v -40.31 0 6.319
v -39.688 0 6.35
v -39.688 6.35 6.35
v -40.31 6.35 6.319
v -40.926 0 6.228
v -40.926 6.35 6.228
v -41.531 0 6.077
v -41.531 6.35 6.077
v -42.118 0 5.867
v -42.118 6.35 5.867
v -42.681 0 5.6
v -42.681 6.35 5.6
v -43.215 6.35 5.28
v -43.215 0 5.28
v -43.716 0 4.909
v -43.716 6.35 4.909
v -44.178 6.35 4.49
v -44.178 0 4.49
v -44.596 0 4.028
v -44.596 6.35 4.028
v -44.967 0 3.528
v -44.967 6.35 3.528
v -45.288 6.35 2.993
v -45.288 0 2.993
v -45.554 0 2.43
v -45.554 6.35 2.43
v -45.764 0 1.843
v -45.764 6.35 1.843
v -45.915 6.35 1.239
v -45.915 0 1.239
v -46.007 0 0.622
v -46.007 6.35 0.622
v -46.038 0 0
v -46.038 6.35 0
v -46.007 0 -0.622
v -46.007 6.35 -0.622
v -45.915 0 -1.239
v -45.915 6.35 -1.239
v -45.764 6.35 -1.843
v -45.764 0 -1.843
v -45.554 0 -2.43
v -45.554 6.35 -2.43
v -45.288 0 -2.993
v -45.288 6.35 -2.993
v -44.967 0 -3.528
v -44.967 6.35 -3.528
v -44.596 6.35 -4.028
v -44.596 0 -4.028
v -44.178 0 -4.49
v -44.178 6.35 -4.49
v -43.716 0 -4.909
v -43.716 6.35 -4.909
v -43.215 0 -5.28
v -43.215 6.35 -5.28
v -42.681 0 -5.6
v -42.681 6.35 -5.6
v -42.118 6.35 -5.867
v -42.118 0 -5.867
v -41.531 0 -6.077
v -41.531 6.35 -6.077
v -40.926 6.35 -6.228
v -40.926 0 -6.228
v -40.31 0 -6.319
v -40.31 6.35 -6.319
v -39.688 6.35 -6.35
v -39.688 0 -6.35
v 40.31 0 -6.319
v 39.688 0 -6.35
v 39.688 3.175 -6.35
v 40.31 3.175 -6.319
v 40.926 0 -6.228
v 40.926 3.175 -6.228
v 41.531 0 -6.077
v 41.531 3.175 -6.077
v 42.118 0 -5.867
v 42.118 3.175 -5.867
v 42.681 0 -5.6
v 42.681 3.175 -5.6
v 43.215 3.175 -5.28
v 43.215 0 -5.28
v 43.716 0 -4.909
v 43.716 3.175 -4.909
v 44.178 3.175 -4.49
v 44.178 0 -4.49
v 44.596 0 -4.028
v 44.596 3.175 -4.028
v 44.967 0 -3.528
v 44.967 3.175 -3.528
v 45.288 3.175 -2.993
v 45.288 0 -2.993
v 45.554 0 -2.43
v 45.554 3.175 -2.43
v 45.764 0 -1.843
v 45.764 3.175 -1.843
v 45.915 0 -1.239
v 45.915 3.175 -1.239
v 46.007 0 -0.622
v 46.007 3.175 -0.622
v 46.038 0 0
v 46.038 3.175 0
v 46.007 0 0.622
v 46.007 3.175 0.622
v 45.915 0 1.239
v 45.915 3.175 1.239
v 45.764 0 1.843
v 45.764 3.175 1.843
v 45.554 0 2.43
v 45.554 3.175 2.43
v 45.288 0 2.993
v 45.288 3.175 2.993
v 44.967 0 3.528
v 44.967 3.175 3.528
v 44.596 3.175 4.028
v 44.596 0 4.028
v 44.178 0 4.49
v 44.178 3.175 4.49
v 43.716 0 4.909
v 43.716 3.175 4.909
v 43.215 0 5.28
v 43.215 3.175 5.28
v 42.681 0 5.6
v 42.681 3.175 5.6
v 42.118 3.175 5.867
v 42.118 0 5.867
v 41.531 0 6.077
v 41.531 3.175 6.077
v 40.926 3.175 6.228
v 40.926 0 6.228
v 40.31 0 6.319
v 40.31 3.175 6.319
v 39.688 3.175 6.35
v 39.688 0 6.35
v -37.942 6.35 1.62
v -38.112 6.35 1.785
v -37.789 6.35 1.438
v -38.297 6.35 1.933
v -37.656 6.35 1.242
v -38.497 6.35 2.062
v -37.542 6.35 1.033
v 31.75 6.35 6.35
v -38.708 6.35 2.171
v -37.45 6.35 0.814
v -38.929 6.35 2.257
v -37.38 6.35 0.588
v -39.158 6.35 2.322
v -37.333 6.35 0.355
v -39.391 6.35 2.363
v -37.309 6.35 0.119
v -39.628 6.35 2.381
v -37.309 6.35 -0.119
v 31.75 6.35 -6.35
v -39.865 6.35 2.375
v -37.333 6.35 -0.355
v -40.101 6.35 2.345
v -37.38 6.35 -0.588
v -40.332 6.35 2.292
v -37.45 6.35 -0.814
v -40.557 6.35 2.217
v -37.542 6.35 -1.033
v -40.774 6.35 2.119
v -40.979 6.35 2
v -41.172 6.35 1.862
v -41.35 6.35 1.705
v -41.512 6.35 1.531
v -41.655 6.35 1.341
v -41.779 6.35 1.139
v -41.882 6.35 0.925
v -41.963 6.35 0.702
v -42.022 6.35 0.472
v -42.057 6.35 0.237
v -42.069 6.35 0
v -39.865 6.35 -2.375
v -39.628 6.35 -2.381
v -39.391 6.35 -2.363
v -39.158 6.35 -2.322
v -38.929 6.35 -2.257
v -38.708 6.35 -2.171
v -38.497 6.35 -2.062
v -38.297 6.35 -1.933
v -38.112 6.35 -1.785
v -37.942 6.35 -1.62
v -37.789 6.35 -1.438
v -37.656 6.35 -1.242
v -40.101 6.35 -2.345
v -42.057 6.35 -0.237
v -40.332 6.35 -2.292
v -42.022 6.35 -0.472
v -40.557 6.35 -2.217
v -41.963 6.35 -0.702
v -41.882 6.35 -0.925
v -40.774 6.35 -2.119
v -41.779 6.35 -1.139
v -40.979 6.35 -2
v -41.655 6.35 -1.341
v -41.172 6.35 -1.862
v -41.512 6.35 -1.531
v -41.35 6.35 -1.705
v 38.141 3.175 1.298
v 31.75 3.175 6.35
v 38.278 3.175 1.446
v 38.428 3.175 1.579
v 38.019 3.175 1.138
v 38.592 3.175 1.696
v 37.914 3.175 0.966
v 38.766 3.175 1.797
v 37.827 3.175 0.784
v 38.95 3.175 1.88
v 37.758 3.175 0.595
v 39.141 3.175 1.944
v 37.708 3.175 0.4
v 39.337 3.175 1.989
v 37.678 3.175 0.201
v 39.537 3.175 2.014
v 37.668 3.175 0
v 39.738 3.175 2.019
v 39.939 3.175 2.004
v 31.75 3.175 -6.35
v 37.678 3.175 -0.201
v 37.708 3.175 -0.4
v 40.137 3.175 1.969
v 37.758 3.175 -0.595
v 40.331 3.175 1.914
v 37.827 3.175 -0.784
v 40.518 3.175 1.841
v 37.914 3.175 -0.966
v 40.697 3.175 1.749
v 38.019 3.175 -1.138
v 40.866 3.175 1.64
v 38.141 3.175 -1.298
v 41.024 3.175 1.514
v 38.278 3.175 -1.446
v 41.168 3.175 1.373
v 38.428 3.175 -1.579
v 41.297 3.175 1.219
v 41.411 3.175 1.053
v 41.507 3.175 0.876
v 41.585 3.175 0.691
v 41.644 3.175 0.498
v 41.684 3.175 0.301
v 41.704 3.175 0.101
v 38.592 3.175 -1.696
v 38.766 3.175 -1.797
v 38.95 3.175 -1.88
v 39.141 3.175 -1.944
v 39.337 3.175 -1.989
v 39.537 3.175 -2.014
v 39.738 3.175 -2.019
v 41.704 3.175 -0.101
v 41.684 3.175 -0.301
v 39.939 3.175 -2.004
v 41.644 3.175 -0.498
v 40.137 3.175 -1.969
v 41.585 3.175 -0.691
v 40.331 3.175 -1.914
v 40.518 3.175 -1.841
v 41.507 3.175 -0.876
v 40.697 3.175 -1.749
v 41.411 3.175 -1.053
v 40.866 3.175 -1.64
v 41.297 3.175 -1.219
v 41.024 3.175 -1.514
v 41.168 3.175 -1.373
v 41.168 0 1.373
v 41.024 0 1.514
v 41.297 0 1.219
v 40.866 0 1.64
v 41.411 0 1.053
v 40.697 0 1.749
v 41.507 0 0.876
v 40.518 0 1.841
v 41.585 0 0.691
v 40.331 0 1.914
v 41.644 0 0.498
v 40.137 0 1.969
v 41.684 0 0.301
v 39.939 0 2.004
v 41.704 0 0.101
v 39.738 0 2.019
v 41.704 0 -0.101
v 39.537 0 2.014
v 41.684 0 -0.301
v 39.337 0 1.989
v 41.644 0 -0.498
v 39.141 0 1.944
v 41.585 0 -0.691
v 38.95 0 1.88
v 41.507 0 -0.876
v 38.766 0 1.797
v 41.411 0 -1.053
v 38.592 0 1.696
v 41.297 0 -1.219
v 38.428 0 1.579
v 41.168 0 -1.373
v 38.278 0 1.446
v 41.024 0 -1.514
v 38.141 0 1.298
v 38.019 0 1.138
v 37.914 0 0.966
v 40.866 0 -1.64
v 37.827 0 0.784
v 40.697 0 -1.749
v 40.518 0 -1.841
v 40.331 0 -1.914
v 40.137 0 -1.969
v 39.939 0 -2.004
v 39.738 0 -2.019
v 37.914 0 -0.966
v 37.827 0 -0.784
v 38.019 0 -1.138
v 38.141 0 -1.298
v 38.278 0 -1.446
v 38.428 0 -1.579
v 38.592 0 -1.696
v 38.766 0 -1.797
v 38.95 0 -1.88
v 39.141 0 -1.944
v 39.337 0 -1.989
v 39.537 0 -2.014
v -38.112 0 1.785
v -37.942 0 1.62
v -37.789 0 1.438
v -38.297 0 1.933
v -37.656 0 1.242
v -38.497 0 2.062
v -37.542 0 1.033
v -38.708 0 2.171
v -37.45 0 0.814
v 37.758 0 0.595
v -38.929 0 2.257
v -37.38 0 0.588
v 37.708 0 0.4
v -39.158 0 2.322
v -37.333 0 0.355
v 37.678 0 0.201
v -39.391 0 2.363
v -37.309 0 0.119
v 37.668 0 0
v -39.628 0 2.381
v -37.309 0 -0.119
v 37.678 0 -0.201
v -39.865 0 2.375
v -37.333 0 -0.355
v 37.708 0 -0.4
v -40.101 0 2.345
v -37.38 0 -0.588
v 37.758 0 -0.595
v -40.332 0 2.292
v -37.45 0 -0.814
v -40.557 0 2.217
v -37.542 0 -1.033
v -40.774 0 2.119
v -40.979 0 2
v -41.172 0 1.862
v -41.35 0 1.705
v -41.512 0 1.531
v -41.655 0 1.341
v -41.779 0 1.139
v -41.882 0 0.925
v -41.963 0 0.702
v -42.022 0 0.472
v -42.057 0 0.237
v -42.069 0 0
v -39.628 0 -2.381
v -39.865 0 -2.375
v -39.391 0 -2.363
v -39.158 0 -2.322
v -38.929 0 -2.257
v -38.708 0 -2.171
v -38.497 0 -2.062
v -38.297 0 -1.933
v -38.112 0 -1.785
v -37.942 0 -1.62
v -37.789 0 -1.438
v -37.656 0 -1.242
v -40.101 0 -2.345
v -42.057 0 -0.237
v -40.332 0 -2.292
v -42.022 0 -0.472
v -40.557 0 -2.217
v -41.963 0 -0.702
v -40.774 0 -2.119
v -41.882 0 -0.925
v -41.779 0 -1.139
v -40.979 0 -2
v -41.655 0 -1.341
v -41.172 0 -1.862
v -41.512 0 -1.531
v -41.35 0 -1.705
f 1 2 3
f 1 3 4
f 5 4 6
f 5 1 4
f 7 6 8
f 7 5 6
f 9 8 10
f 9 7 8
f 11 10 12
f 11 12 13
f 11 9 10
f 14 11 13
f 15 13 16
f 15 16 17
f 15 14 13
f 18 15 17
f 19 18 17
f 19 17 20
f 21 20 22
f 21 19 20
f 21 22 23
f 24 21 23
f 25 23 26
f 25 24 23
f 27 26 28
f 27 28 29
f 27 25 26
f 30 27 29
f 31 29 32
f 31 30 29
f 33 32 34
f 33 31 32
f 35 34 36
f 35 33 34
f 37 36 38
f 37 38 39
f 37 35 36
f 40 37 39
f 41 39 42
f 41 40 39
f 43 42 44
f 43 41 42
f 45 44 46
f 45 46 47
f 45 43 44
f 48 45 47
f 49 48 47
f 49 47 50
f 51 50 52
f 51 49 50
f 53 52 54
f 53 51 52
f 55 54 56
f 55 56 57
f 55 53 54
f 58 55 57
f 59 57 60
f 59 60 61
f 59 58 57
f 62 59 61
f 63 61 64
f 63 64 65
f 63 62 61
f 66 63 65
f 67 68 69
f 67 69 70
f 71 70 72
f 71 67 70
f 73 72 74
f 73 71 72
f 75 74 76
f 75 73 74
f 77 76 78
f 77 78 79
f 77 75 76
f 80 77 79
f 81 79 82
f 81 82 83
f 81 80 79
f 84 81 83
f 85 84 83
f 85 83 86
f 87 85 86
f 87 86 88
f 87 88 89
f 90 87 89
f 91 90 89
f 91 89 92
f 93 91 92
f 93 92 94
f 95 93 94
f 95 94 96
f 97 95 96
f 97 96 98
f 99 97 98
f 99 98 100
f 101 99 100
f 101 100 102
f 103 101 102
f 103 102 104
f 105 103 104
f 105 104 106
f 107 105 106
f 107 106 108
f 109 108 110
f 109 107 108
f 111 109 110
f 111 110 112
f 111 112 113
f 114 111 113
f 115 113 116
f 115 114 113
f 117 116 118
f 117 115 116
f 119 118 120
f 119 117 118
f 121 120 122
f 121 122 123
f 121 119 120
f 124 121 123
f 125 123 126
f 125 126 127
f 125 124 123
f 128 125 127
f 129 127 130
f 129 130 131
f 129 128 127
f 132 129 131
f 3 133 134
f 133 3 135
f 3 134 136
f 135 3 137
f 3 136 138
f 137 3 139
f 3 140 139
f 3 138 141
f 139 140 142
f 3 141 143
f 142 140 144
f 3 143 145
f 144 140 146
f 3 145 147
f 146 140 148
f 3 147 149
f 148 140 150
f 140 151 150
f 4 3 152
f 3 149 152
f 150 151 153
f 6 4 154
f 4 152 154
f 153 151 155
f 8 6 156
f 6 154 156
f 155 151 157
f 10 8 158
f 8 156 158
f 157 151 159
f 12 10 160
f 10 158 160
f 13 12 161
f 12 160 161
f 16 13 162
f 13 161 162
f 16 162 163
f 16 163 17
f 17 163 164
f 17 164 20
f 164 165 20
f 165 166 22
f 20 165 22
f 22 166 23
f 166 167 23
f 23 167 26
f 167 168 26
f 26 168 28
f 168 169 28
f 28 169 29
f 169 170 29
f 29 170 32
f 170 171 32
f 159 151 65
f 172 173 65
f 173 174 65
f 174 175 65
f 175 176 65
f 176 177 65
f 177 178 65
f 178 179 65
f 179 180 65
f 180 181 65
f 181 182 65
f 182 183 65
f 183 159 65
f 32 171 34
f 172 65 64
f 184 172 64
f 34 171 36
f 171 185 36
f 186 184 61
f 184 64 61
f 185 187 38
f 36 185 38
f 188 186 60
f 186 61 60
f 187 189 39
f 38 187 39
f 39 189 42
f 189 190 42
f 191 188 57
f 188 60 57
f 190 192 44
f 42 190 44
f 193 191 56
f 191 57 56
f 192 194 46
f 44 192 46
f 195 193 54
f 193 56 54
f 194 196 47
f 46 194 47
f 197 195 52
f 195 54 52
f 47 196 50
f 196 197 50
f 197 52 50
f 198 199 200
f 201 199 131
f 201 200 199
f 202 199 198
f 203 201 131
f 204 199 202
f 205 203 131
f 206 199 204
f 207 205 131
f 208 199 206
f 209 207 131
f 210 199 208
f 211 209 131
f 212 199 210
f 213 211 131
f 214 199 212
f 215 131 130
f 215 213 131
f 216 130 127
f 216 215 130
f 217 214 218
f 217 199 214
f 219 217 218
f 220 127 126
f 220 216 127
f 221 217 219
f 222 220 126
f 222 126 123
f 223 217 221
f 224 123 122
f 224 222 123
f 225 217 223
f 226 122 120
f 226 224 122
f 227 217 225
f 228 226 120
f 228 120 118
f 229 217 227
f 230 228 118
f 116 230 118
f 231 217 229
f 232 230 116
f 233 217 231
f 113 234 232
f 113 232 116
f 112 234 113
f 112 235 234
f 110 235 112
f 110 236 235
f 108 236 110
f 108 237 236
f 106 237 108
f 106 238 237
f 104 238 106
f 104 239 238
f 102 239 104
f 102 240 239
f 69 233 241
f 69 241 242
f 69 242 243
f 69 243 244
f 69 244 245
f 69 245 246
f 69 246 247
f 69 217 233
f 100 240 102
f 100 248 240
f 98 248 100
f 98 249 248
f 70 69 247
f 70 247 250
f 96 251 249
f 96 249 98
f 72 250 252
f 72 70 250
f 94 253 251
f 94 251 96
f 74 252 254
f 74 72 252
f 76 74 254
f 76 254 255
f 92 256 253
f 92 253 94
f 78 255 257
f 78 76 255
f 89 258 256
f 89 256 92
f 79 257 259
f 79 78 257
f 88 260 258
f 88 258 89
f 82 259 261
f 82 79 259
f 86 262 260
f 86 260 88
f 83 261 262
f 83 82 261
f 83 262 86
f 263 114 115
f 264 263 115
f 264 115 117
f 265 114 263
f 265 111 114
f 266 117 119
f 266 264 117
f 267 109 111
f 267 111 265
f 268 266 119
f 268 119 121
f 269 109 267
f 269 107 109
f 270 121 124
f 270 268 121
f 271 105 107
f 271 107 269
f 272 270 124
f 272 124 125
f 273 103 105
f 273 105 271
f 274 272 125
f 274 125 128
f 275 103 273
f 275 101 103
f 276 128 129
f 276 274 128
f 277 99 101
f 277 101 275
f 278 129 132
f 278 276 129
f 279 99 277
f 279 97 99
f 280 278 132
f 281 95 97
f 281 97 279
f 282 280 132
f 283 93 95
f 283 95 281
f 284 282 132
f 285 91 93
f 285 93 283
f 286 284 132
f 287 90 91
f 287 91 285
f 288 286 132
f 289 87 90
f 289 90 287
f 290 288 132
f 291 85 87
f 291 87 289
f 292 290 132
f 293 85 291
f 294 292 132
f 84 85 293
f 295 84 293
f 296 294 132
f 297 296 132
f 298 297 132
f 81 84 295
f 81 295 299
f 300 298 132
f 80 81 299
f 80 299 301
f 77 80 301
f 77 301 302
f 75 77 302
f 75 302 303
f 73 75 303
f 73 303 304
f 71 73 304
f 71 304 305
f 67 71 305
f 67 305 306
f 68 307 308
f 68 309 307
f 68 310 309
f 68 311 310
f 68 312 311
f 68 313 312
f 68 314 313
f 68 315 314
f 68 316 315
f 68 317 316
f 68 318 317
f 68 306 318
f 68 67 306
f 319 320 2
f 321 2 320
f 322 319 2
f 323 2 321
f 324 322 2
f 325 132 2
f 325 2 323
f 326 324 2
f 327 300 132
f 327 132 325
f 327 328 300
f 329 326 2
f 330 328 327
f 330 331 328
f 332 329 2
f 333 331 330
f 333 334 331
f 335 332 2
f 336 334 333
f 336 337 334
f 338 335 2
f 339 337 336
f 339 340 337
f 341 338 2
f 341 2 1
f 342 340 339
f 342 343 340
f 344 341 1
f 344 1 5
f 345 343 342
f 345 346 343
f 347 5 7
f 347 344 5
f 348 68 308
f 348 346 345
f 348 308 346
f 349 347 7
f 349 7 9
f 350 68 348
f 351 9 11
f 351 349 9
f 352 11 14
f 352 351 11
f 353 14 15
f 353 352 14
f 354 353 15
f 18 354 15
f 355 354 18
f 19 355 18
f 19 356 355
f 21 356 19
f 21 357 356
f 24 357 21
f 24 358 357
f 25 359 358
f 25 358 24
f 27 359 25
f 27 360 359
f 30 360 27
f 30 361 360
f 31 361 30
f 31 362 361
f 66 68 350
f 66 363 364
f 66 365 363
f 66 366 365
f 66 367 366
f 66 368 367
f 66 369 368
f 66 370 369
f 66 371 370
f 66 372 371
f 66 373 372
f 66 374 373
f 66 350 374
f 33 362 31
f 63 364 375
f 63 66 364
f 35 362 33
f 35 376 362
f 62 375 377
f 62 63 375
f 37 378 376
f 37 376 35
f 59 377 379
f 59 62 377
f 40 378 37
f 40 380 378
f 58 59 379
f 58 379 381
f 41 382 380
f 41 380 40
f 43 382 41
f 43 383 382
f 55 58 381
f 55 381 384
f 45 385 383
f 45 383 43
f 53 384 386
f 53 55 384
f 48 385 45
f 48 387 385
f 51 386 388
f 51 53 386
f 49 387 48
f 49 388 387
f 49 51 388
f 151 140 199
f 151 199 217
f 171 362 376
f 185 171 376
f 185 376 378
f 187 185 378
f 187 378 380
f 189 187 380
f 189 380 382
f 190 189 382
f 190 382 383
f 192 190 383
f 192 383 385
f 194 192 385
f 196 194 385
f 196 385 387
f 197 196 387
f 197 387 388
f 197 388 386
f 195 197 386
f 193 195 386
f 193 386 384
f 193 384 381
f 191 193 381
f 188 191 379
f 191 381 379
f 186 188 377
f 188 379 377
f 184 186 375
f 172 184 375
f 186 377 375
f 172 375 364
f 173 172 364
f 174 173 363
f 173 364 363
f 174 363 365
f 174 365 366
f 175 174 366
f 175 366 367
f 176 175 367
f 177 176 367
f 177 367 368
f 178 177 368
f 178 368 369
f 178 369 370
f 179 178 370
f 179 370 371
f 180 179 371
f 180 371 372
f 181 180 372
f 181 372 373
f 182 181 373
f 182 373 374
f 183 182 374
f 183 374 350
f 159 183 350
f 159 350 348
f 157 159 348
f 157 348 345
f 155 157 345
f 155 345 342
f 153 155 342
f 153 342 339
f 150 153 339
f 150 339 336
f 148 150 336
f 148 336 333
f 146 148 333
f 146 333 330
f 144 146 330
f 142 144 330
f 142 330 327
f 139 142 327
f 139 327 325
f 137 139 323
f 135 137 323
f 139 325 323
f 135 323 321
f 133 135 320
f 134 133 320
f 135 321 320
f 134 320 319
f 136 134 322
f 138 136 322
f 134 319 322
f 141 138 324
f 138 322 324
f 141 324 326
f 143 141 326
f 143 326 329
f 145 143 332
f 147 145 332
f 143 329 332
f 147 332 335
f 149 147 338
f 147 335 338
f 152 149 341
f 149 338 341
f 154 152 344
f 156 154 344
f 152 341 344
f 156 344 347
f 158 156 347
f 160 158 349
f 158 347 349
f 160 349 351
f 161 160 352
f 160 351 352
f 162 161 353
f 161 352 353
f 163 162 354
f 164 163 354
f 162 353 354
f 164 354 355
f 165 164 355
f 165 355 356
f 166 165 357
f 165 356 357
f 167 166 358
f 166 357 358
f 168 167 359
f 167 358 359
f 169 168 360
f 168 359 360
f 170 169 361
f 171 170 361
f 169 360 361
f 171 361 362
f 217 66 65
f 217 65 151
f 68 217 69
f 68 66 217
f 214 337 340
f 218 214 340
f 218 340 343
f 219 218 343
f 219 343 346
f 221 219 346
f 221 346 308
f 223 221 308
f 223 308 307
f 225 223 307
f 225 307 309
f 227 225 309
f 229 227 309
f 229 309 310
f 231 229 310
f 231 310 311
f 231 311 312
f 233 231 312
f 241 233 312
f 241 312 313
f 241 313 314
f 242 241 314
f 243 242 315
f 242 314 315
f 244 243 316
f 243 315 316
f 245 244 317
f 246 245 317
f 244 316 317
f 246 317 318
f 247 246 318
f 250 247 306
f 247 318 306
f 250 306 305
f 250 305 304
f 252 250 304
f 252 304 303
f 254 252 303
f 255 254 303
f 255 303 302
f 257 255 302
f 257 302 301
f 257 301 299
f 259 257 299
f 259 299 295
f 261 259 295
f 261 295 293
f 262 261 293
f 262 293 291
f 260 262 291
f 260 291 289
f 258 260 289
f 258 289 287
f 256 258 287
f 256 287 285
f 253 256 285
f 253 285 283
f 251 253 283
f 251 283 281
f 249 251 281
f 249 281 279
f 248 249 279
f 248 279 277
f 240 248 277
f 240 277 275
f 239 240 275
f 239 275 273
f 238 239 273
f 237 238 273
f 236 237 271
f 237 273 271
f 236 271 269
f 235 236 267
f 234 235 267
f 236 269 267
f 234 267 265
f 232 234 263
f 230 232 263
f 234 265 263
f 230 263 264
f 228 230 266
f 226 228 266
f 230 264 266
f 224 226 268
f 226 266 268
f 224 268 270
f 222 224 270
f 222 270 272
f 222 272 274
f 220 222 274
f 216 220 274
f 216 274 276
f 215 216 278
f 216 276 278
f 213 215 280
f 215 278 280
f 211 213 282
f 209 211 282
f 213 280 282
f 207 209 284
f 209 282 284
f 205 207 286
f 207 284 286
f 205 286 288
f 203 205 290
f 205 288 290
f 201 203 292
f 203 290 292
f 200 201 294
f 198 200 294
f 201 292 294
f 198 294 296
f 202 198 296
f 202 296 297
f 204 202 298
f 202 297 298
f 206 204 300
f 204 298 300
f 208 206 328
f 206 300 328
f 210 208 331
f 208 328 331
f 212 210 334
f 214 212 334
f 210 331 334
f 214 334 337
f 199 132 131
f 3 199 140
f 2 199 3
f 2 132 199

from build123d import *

# Parameters (mm, degrees)
BOSS_EXTRUDE1_DEPTH            = 6.35
F_3_16_0_1875_DIAMETER_HOLE1_D = 4.7625
F_21_0_159_DIAMETER_HOLE1_D    = 4.0386
SKETCH4_W                      = 15.875
SKETCH4_H                      = 12.7
CUT_EXTRUDE1_DEPTH             = 3.175


with BuildPart() as part:
    # Sketch1 → Boss-Extrude1 (new body)
    with BuildSketch(Plane(origin=(0, 0, 0), x_dir=(1, 0, 0), z_dir=(0, 1, 0))):
        with BuildLine():
            Line((-39.6875, 6.35), (39.6875, 6.35))
            ThreePointArc((39.6875, 6.35), (46.0375, 0), (39.6875, -6.35))
            Line((39.6875, -6.35), (-39.6875, -6.35))
            ThreePointArc((-39.6875, -6.35), (-46.0375, 0), (-39.6875, 6.35))
        make_face()
    extrude(amount=BOSS_EXTRUDE1_DEPTH)

    # 3/16 (0.1875) Diameter Hole1 (through all)
    with Locations(Plane(origin=(0, 6.35, 0), x_dir=(1, 0, 0), z_dir=(0, 1, 0))):
        with Locations((-39.6875, 0)):
            Hole(F_3_16_0_1875_DIAMETER_HOLE1_D / 2)

    # #21 (0.159) Diameter Hole1 (through all)
    with Locations(Plane(origin=(0, 6.35, 0), x_dir=(1, 0, 0), z_dir=(0, 1, 0))):
        with Locations((39.6875, 0)):
            Hole(F_21_0_159_DIAMETER_HOLE1_D / 2)

    # Sketch4 → Cut-Extrude1 (cut)
    with BuildSketch(Plane(origin=(0, 6.35, 0), x_dir=(1, 0, 0), z_dir=(0, 1, 0))):
        with Locations((39.6875, 0)):
            Rectangle(SKETCH4_W, SKETCH4_H)
    extrude(amount=-CUT_EXTRUDE1_DEPTH, mode=Mode.SUBTRACT)


solid = part.part
